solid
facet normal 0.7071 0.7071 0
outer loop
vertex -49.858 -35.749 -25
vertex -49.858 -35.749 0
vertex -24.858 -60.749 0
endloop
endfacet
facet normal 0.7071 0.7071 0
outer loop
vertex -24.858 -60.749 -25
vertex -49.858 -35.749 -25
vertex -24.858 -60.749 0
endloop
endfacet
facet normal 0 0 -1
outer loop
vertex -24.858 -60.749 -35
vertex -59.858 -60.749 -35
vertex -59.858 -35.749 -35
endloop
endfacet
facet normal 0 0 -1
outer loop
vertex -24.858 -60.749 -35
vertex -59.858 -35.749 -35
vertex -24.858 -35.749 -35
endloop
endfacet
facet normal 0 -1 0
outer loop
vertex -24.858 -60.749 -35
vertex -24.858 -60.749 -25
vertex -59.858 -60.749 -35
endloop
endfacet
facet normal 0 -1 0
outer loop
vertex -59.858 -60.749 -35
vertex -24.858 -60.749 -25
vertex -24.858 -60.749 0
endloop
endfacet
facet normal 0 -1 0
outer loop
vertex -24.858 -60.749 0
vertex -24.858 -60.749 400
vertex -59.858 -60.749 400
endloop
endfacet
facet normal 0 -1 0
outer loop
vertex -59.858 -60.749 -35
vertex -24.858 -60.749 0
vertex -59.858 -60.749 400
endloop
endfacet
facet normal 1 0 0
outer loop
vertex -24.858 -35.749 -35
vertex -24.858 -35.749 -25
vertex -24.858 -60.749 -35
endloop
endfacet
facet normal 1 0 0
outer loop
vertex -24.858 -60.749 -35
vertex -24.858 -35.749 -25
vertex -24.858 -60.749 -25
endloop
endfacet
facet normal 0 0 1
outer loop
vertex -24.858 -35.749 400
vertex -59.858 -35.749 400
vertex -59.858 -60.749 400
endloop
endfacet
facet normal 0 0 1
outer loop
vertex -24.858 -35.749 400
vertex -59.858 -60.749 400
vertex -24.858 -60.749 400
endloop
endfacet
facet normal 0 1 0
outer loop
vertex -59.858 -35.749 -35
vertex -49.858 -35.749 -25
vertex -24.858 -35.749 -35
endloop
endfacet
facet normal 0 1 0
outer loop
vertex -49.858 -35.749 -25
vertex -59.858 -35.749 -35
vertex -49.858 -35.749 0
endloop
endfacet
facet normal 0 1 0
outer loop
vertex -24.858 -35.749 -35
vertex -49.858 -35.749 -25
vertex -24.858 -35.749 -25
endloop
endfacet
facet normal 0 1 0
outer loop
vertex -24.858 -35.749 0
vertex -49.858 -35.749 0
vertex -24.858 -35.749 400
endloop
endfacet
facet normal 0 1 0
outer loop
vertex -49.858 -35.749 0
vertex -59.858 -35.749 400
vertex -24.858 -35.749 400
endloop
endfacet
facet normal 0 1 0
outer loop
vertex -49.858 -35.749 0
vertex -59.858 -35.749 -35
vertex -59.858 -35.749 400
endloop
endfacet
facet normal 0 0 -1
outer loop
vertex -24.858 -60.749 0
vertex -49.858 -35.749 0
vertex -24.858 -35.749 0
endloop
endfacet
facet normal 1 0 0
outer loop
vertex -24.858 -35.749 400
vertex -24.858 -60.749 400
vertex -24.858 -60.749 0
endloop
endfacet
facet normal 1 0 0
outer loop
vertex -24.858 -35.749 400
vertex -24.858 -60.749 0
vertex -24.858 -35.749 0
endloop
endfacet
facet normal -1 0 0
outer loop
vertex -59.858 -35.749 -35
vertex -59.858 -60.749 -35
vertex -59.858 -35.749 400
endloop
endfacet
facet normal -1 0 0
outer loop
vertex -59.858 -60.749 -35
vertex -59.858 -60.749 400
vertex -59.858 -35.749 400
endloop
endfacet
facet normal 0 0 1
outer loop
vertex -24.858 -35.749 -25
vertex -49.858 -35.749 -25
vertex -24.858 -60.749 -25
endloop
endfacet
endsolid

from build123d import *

# Parameters (mm, degrees)
F0_W     = 35
F0_H     = 25
F1_DEPTH = 400
F3_DEPTH = 25
F5_DEPTH = 10


with BuildPart() as f1:
    # F0 (on Top) → F1 (new body)
    with BuildSketch(Plane.XY):
        with Locations((-42.358379, -48.249161)):
            Rectangle(F0_W, F0_H)
    extrude(amount=F1_DEPTH)

    # F2 (on face) → F3 (join)
    with BuildSketch(Plane(origin=(0, 0, 0), x_dir=(1, 0, 0), z_dir=(0, 0, -1))):
        Polygon((-49.858379, 35.749161), (-24.858379, 60.749161), (-59.858379, 60.749161), (-59.858379, 35.749161), align=None)
    extrude(amount=F3_DEPTH)

    # F4 (on face) → F5 (join)
    with BuildSketch(Plane(origin=(0, 0, -25), x_dir=(1, 0, 0), z_dir=(0, 0, -1))):
        Polygon((-24.858379, 60.749161), (-59.858379, 60.749161), (-59.858379, 35.749161), (-49.858379, 35.749161), align=None)
        Polygon((-24.858379, 35.749161), (-24.858379, 60.749161), (-49.858379, 35.749161), align=None)
    extrude(amount=F5_DEPTH)


solid = f1.part
